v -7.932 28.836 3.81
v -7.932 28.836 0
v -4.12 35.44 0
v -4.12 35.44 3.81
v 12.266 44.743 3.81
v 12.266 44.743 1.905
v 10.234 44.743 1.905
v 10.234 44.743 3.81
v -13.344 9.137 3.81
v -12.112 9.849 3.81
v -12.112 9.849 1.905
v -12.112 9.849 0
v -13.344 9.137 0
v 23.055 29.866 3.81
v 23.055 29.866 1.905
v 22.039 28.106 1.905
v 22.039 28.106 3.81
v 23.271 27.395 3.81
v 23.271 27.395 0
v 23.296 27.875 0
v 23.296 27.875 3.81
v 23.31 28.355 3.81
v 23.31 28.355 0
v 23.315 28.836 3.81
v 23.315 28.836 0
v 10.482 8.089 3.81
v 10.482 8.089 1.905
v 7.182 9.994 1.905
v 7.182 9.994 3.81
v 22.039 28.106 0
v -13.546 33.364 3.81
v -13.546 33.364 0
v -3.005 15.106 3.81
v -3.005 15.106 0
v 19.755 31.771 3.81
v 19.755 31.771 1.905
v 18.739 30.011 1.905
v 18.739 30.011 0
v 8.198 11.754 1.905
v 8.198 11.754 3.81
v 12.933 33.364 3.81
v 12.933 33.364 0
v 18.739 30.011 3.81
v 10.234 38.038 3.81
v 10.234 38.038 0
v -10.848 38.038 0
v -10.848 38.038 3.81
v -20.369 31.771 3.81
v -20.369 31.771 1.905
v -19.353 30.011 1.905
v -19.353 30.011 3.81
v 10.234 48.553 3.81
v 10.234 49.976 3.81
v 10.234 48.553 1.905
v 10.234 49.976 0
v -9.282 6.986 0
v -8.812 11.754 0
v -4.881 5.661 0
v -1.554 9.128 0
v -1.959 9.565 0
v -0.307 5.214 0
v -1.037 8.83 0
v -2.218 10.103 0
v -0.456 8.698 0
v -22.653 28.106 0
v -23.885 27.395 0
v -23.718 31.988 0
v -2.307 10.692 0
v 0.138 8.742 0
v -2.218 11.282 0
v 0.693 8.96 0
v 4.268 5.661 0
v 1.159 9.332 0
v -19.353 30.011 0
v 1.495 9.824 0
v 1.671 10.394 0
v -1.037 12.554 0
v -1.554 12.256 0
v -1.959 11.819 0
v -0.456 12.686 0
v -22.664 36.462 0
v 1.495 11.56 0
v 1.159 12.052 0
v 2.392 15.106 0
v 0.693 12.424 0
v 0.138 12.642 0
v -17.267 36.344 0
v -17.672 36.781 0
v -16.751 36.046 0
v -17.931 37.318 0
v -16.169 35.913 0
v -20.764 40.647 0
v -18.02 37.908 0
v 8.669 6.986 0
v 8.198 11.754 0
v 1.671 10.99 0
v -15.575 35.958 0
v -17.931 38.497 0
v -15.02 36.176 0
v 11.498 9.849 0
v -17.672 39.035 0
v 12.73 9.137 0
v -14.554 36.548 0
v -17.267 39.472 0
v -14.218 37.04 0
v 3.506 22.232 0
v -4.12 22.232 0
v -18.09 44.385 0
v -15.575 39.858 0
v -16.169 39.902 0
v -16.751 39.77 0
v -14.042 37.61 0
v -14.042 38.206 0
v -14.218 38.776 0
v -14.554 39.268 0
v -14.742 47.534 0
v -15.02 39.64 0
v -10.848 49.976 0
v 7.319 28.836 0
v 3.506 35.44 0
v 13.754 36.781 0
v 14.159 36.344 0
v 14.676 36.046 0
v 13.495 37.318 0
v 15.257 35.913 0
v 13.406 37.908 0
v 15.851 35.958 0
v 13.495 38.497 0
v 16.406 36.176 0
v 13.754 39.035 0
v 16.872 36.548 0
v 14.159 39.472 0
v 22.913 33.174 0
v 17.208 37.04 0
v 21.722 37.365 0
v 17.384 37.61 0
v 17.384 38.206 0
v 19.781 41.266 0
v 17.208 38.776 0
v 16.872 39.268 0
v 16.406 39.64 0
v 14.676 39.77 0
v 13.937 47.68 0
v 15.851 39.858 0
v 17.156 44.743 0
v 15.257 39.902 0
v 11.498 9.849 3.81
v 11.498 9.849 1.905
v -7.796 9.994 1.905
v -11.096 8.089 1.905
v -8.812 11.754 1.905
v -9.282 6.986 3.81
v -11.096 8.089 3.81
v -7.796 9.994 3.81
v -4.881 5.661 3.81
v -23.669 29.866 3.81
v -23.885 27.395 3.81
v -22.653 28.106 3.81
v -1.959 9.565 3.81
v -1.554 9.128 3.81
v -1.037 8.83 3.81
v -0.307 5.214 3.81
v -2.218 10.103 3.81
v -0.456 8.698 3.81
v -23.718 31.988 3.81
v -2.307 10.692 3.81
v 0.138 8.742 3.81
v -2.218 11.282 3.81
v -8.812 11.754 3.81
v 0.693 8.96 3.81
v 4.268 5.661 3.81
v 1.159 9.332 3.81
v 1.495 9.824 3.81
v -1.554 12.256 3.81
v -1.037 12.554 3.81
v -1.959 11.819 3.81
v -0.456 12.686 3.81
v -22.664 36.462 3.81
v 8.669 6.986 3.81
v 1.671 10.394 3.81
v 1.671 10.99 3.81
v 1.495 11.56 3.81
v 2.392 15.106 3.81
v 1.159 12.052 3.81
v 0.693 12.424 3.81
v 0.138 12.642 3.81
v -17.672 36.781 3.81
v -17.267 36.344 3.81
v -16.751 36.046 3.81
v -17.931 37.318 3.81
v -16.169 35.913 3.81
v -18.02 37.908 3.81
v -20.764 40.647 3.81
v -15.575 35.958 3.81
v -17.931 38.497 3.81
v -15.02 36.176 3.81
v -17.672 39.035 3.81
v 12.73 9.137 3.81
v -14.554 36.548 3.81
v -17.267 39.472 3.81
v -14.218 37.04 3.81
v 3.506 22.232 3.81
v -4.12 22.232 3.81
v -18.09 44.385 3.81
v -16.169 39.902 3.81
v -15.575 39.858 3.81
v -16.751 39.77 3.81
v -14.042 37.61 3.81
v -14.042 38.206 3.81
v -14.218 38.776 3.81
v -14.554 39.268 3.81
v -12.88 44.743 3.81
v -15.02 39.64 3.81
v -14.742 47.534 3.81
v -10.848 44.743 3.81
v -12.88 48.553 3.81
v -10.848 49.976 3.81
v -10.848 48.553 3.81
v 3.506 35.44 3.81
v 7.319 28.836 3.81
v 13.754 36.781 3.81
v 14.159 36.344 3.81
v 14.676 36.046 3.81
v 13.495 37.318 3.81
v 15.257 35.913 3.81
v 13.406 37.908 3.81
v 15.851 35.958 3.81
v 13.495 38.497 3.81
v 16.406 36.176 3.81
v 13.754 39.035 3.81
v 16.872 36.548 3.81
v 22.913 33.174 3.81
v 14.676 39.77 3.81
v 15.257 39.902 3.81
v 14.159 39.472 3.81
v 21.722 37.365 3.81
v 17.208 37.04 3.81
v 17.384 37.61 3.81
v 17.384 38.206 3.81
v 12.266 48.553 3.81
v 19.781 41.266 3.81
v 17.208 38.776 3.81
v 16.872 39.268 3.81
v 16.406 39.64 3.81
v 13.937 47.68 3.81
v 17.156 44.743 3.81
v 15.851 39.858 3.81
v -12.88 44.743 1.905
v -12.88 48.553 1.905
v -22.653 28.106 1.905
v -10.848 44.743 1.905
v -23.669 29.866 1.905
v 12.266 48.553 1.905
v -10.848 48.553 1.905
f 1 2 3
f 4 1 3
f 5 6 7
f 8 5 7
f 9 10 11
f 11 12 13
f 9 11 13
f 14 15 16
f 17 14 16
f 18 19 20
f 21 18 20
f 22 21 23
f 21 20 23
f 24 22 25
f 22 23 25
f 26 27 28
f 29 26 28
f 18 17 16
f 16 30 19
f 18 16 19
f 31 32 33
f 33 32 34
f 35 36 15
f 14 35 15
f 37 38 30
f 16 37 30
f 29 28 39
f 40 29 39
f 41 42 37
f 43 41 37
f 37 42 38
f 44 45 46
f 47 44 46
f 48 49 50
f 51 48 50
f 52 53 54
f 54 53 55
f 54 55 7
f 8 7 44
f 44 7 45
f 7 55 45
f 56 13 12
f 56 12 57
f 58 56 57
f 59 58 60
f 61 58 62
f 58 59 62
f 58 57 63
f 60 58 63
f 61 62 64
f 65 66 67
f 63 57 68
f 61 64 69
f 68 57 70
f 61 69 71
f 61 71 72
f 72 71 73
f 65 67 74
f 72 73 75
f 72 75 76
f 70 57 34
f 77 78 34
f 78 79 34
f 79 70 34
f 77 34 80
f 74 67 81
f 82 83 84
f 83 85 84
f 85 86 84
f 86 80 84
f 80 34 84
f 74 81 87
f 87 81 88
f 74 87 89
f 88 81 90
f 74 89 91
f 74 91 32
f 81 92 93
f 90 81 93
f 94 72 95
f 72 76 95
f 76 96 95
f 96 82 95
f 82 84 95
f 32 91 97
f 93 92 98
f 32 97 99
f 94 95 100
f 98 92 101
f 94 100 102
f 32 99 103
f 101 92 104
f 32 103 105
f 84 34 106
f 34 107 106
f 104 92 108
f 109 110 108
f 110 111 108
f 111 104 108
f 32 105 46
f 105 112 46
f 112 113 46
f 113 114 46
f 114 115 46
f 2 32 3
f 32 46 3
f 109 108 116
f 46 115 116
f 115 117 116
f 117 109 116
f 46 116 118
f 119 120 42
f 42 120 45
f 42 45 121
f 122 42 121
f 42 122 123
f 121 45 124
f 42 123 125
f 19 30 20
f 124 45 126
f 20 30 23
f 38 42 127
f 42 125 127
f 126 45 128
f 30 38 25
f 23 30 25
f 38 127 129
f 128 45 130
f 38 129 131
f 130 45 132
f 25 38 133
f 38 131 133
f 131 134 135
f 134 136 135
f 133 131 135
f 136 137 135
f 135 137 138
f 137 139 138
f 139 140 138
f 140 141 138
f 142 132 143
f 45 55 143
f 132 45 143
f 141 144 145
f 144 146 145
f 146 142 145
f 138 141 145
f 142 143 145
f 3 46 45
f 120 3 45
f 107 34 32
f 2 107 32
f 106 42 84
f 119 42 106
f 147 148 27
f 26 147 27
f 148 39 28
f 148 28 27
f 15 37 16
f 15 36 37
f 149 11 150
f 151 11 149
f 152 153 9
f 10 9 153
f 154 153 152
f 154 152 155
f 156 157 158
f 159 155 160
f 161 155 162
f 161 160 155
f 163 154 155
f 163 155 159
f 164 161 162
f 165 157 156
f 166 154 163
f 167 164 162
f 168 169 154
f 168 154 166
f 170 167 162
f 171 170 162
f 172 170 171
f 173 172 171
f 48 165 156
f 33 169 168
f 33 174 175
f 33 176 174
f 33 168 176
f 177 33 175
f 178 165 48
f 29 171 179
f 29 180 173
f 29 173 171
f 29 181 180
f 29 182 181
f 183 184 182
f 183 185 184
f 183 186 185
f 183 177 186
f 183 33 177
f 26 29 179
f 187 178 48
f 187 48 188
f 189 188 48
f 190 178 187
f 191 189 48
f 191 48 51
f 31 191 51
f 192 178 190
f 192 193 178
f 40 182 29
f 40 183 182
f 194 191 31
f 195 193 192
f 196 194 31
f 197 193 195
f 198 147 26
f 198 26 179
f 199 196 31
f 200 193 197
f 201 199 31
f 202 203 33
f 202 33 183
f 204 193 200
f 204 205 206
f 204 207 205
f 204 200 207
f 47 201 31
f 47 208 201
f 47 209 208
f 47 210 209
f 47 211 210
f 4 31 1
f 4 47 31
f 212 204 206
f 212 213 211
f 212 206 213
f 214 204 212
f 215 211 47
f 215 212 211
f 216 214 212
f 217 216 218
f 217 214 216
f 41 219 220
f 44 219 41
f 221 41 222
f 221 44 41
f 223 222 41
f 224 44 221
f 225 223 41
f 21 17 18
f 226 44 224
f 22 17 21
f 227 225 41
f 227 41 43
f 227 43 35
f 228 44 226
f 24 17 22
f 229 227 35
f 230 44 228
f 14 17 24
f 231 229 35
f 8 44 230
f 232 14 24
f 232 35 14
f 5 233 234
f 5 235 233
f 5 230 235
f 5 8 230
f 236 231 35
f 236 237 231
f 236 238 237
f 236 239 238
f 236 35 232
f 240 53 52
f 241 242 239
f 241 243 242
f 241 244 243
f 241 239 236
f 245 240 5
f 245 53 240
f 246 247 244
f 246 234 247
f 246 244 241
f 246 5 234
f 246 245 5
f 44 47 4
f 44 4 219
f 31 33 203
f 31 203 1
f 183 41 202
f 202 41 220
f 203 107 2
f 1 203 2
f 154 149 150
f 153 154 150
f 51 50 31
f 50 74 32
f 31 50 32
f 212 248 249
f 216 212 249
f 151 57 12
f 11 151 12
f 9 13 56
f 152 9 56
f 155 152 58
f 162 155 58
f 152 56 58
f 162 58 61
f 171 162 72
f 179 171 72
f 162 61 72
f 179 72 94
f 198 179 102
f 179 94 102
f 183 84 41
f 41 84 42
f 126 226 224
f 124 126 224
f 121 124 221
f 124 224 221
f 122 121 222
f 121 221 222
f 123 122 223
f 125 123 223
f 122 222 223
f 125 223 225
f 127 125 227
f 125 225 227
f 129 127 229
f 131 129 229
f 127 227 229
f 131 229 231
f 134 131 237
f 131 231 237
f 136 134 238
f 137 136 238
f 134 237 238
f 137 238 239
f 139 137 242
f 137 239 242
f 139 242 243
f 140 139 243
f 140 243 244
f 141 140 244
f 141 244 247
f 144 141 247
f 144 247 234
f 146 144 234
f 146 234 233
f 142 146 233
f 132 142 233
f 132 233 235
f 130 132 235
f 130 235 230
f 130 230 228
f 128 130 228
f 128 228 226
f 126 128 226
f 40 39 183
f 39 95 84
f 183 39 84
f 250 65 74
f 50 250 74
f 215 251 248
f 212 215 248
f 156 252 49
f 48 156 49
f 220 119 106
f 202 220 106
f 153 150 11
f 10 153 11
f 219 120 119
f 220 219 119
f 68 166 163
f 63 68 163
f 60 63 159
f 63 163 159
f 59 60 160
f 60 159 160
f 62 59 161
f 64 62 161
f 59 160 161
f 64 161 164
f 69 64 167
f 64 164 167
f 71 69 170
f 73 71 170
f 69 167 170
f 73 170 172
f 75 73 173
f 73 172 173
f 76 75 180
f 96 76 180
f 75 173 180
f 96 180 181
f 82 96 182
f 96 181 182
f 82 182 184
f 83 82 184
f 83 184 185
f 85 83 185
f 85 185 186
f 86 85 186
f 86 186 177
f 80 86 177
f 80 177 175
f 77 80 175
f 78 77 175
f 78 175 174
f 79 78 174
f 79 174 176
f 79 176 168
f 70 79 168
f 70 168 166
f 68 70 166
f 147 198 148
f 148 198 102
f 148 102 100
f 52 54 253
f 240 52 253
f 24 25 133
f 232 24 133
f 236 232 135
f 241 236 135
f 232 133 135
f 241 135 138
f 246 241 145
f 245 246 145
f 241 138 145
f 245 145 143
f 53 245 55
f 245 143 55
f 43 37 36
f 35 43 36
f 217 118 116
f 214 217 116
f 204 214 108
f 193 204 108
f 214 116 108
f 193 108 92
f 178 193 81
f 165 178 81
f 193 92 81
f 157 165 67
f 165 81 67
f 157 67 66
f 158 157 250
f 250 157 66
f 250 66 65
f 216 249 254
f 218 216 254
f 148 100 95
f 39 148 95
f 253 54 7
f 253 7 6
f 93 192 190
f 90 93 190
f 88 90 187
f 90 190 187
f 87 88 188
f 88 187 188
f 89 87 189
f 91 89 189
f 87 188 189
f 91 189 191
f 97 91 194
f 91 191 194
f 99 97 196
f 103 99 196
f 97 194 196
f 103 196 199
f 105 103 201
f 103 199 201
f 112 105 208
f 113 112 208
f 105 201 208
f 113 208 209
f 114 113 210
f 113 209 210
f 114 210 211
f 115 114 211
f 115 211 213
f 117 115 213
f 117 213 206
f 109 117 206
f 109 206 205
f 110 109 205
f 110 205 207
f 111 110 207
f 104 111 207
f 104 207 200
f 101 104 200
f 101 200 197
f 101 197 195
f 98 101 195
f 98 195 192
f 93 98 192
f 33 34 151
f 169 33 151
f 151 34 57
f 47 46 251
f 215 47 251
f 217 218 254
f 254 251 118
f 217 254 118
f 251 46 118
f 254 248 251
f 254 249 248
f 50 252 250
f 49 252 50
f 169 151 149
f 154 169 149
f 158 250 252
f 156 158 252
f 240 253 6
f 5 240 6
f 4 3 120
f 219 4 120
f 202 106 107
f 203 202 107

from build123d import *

# Parameters (mm, degrees)
F1_DEPTH = 3.81
F0_W     = 2.032
F0_H     = 3.81
F2_DEPTH = 1.905
F3_D     = 4


with BuildPart() as f1:
    # F0 (on Top) → F1 (new body)
    with BuildSketch(Plane.XY):
        with BuildLine():
            ThreePointArc((23.2712226898, 27.3948570229), (23.3042181614, 28.1150551719), (23.315220068, 28.8359248085))
            ThreePointArc((23.315220068, 28.8359248085), (19.7805094073, 41.2657152733), (10.234220068, 49.9756079424))
            Line((10.234220068, 49.9756079424), (10.234220068, 48.5526951571))
            Line((10.234220068, 48.5526951571), (12.266220068, 48.5526951571))
            Line((12.266220068, 48.5526951571), (12.266220068, 44.7426951571))
            Line((12.266220068, 44.7426951571), (10.234220068, 44.7426951571))
            Line((10.234220068, 44.7426951571), (10.234220068, 38.0376079424))
            Line((10.234220068, 38.0376079424), (-10.847779932, 38.0376079424))
            Line((-10.847779932, 38.0376079424), (-10.847779932, 44.7426951571))
            Line((-10.847779932, 44.7426951571), (-12.879779932, 44.7426951571))
            Line((-12.879779932, 44.7426951571), (-12.879779932, 48.5526951571))
            Line((-12.879779932, 48.5526951571), (-10.847779932, 48.5526951571))
            Line((-10.847779932, 48.5526951571), (-10.847779932, 49.9756079424))
            ThreePointArc((-10.847779932, 49.9756079424), (-20.7640320202, 40.6469248085), (-23.8847825539, 27.3948570229))
            Line((-23.8847825539, 27.3948570229), (-22.6525039345, 28.1063134155))
            Line((-22.6525039345, 28.1063134155), (-23.6685039345, 29.866077036))
            Line((-23.6685039345, 29.866077036), (-20.3689471461, 31.771077036))
            Line((-20.3689471461, 31.771077036), (-19.3529471461, 30.0113134155))
            Line((-19.3529471461, 30.0113134155), (-13.5461712835, 33.3638570229))
            Line((-13.5461712835, 33.3638570229), (-3.0051712835, 15.1063094603))
            Line((-3.0051712835, 15.1063094603), (-8.8119471461, 11.7537658529))
            Line((-8.8119471461, 11.7537658529), (-7.7959471461, 9.9940022324))
            Line((-7.7959471461, 9.9940022324), (-11.0955039345, 8.0890022324))
            Line((-11.0955039345, 8.0890022324), (-12.1115039345, 9.8487658529))
            Line((-12.1115039345, 9.8487658529), (-13.3437825539, 9.1373094603))
            ThreePointArc((-13.3437825539, 9.1373094603), (-0.306779932, 5.2139248085), (12.7302226898, 9.1373094603))
            Line((12.7302226898, 9.1373094603), (11.4979440704, 9.8487658529))
            Line((11.4979440704, 9.8487658529), (10.4819440704, 8.0890022324))
            Line((10.4819440704, 8.0890022324), (7.182387282, 9.9940022324))
            Line((7.182387282, 9.9940022324), (8.198387282, 11.7537658529))
            Line((8.198387282, 11.7537658529), (2.3916114195, 15.1063094603))
            Line((2.3916114195, 15.1063094603), (12.9326114195, 33.3638570229))
            Line((12.9326114195, 33.3638570229), (18.739387282, 30.0113134155))
            Line((18.739387282, 30.0113134155), (19.755387282, 31.771077036))
            Line((19.755387282, 31.771077036), (23.0549440704, 29.866077036))
            Line((23.0549440704, 29.866077036), (22.0389440704, 28.1063134155))
            Line((22.0389440704, 28.1063134155), (23.2712226898, 27.3948570229))
        make_face()
        Polygon((-7.9324222875, 28.8359248085), (-4.1196011098, 35.4399248085), (3.5060412457, 35.4399248085), (7.3188624234, 28.8359248085), (3.5060412457, 22.2319248085), (-4.1196011098, 22.2319248085), align=None, mode=Mode.SUBTRACT)
    extrude(amount=F1_DEPTH)

    # F0 (on Top) → F2 (join)
    with BuildSketch(Plane.XY):
        with BuildLine():
            ThreePointArc((23.2712226898, 27.3948570229), (23.3042181614, 28.1150551719), (23.315220068, 28.8359248085))
            ThreePointArc((23.315220068, 28.8359248085), (19.7805094073, 41.2657152733), (10.234220068, 49.9756079424))
            Line((10.234220068, 49.9756079424), (10.234220068, 48.5526951571))
            Line((10.234220068, 48.5526951571), (12.266220068, 48.5526951571))
            Line((12.266220068, 48.5526951571), (12.266220068, 44.7426951571))
            Line((12.266220068, 44.7426951571), (10.234220068, 44.7426951571))
            Line((10.234220068, 44.7426951571), (10.234220068, 38.0376079424))
            Line((10.234220068, 38.0376079424), (-10.847779932, 38.0376079424))
            Line((-10.847779932, 38.0376079424), (-10.847779932, 44.7426951571))
            Line((-10.847779932, 44.7426951571), (-12.879779932, 44.7426951571))
            Line((-12.879779932, 44.7426951571), (-12.879779932, 48.5526951571))
            Line((-12.879779932, 48.5526951571), (-10.847779932, 48.5526951571))
            Line((-10.847779932, 48.5526951571), (-10.847779932, 49.9756079424))
            ThreePointArc((-10.847779932, 49.9756079424), (-20.7640320202, 40.6469248085), (-23.8847825539, 27.3948570229))
            Line((-23.8847825539, 27.3948570229), (-22.6525039345, 28.1063134155))
            Line((-22.6525039345, 28.1063134155), (-23.6685039345, 29.866077036))
            Line((-23.6685039345, 29.866077036), (-20.3689471461, 31.771077036))
            Line((-20.3689471461, 31.771077036), (-19.3529471461, 30.0113134155))
            Line((-19.3529471461, 30.0113134155), (-13.5461712835, 33.3638570229))
            Line((-13.5461712835, 33.3638570229), (-3.0051712835, 15.1063094603))
            Line((-3.0051712835, 15.1063094603), (-8.8119471461, 11.7537658529))
            Line((-8.8119471461, 11.7537658529), (-7.7959471461, 9.9940022324))
            Line((-7.7959471461, 9.9940022324), (-11.0955039345, 8.0890022324))
            Line((-11.0955039345, 8.0890022324), (-12.1115039345, 9.8487658529))
            Line((-12.1115039345, 9.8487658529), (-13.3437825539, 9.1373094603))
            ThreePointArc((-13.3437825539, 9.1373094603), (-0.306779932, 5.2139248085), (12.7302226898, 9.1373094603))
            Line((12.7302226898, 9.1373094603), (11.4979440704, 9.8487658529))
            Line((11.4979440704, 9.8487658529), (10.4819440704, 8.0890022324))
            Line((10.4819440704, 8.0890022324), (7.182387282, 9.9940022324))
            Line((7.182387282, 9.9940022324), (8.198387282, 11.7537658529))
            Line((8.198387282, 11.7537658529), (2.3916114195, 15.1063094603))
            Line((2.3916114195, 15.1063094603), (12.9326114195, 33.3638570229))
            Line((12.9326114195, 33.3638570229), (18.739387282, 30.0113134155))
            Line((18.739387282, 30.0113134155), (19.755387282, 31.771077036))
            Line((19.755387282, 31.771077036), (23.0549440704, 29.866077036))
            Line((23.0549440704, 29.866077036), (22.0389440704, 28.1063134155))
            Line((22.0389440704, 28.1063134155), (23.2712226898, 27.3948570229))
        make_face()
        Polygon((-7.9324222875, 28.8359248085), (-4.1196011098, 35.4399248085), (3.5060412457, 35.4399248085), (7.3188624234, 28.8359248085), (3.5060412457, 22.2319248085), (-4.1196011098, 22.2319248085), align=None, mode=Mode.SUBTRACT)
        with Locations((-11.863779932, 46.6476951571)):
            Rectangle(F0_W, F0_H)
        with Locations((11.250220068, 46.6476951571)):
            Rectangle(F0_W, F0_H)
        Polygon((18.739387282, 30.0113134155), (22.0389440704, 28.1063134155), (23.0549440704, 29.866077036), (19.755387282, 31.771077036), align=None)
        Polygon((10.4819440704, 8.0890022324), (11.4979440704, 9.8487658529), (8.198387282, 11.7537658529), (7.182387282, 9.9940022324), align=None)
        Polygon((-8.8119471461, 11.7537658529), (-12.1115039345, 9.8487658529), (-11.0955039345, 8.0890022324), (-7.7959471461, 9.9940022324), align=None)
        Polygon((-23.6685039345, 29.866077036), (-22.6525039345, 28.1063134155), (-19.3529471461, 30.0113134155), (-20.3689471461, 31.771077036), align=None)
    extrude(amount=F2_DEPTH)

    # F3 (through all)
    with Locations(Plane(origin=(0, 0, 0), x_dir=(1, 0, 0), z_dir=(0, 0, -1))):
        with Locations((-16.0198342927, -37.9078609734), (15.4062744286, -37.9078609734), (-0.306779932, -10.6920524787)):
            Hole(F3_D / 2)


solid = f1.part
